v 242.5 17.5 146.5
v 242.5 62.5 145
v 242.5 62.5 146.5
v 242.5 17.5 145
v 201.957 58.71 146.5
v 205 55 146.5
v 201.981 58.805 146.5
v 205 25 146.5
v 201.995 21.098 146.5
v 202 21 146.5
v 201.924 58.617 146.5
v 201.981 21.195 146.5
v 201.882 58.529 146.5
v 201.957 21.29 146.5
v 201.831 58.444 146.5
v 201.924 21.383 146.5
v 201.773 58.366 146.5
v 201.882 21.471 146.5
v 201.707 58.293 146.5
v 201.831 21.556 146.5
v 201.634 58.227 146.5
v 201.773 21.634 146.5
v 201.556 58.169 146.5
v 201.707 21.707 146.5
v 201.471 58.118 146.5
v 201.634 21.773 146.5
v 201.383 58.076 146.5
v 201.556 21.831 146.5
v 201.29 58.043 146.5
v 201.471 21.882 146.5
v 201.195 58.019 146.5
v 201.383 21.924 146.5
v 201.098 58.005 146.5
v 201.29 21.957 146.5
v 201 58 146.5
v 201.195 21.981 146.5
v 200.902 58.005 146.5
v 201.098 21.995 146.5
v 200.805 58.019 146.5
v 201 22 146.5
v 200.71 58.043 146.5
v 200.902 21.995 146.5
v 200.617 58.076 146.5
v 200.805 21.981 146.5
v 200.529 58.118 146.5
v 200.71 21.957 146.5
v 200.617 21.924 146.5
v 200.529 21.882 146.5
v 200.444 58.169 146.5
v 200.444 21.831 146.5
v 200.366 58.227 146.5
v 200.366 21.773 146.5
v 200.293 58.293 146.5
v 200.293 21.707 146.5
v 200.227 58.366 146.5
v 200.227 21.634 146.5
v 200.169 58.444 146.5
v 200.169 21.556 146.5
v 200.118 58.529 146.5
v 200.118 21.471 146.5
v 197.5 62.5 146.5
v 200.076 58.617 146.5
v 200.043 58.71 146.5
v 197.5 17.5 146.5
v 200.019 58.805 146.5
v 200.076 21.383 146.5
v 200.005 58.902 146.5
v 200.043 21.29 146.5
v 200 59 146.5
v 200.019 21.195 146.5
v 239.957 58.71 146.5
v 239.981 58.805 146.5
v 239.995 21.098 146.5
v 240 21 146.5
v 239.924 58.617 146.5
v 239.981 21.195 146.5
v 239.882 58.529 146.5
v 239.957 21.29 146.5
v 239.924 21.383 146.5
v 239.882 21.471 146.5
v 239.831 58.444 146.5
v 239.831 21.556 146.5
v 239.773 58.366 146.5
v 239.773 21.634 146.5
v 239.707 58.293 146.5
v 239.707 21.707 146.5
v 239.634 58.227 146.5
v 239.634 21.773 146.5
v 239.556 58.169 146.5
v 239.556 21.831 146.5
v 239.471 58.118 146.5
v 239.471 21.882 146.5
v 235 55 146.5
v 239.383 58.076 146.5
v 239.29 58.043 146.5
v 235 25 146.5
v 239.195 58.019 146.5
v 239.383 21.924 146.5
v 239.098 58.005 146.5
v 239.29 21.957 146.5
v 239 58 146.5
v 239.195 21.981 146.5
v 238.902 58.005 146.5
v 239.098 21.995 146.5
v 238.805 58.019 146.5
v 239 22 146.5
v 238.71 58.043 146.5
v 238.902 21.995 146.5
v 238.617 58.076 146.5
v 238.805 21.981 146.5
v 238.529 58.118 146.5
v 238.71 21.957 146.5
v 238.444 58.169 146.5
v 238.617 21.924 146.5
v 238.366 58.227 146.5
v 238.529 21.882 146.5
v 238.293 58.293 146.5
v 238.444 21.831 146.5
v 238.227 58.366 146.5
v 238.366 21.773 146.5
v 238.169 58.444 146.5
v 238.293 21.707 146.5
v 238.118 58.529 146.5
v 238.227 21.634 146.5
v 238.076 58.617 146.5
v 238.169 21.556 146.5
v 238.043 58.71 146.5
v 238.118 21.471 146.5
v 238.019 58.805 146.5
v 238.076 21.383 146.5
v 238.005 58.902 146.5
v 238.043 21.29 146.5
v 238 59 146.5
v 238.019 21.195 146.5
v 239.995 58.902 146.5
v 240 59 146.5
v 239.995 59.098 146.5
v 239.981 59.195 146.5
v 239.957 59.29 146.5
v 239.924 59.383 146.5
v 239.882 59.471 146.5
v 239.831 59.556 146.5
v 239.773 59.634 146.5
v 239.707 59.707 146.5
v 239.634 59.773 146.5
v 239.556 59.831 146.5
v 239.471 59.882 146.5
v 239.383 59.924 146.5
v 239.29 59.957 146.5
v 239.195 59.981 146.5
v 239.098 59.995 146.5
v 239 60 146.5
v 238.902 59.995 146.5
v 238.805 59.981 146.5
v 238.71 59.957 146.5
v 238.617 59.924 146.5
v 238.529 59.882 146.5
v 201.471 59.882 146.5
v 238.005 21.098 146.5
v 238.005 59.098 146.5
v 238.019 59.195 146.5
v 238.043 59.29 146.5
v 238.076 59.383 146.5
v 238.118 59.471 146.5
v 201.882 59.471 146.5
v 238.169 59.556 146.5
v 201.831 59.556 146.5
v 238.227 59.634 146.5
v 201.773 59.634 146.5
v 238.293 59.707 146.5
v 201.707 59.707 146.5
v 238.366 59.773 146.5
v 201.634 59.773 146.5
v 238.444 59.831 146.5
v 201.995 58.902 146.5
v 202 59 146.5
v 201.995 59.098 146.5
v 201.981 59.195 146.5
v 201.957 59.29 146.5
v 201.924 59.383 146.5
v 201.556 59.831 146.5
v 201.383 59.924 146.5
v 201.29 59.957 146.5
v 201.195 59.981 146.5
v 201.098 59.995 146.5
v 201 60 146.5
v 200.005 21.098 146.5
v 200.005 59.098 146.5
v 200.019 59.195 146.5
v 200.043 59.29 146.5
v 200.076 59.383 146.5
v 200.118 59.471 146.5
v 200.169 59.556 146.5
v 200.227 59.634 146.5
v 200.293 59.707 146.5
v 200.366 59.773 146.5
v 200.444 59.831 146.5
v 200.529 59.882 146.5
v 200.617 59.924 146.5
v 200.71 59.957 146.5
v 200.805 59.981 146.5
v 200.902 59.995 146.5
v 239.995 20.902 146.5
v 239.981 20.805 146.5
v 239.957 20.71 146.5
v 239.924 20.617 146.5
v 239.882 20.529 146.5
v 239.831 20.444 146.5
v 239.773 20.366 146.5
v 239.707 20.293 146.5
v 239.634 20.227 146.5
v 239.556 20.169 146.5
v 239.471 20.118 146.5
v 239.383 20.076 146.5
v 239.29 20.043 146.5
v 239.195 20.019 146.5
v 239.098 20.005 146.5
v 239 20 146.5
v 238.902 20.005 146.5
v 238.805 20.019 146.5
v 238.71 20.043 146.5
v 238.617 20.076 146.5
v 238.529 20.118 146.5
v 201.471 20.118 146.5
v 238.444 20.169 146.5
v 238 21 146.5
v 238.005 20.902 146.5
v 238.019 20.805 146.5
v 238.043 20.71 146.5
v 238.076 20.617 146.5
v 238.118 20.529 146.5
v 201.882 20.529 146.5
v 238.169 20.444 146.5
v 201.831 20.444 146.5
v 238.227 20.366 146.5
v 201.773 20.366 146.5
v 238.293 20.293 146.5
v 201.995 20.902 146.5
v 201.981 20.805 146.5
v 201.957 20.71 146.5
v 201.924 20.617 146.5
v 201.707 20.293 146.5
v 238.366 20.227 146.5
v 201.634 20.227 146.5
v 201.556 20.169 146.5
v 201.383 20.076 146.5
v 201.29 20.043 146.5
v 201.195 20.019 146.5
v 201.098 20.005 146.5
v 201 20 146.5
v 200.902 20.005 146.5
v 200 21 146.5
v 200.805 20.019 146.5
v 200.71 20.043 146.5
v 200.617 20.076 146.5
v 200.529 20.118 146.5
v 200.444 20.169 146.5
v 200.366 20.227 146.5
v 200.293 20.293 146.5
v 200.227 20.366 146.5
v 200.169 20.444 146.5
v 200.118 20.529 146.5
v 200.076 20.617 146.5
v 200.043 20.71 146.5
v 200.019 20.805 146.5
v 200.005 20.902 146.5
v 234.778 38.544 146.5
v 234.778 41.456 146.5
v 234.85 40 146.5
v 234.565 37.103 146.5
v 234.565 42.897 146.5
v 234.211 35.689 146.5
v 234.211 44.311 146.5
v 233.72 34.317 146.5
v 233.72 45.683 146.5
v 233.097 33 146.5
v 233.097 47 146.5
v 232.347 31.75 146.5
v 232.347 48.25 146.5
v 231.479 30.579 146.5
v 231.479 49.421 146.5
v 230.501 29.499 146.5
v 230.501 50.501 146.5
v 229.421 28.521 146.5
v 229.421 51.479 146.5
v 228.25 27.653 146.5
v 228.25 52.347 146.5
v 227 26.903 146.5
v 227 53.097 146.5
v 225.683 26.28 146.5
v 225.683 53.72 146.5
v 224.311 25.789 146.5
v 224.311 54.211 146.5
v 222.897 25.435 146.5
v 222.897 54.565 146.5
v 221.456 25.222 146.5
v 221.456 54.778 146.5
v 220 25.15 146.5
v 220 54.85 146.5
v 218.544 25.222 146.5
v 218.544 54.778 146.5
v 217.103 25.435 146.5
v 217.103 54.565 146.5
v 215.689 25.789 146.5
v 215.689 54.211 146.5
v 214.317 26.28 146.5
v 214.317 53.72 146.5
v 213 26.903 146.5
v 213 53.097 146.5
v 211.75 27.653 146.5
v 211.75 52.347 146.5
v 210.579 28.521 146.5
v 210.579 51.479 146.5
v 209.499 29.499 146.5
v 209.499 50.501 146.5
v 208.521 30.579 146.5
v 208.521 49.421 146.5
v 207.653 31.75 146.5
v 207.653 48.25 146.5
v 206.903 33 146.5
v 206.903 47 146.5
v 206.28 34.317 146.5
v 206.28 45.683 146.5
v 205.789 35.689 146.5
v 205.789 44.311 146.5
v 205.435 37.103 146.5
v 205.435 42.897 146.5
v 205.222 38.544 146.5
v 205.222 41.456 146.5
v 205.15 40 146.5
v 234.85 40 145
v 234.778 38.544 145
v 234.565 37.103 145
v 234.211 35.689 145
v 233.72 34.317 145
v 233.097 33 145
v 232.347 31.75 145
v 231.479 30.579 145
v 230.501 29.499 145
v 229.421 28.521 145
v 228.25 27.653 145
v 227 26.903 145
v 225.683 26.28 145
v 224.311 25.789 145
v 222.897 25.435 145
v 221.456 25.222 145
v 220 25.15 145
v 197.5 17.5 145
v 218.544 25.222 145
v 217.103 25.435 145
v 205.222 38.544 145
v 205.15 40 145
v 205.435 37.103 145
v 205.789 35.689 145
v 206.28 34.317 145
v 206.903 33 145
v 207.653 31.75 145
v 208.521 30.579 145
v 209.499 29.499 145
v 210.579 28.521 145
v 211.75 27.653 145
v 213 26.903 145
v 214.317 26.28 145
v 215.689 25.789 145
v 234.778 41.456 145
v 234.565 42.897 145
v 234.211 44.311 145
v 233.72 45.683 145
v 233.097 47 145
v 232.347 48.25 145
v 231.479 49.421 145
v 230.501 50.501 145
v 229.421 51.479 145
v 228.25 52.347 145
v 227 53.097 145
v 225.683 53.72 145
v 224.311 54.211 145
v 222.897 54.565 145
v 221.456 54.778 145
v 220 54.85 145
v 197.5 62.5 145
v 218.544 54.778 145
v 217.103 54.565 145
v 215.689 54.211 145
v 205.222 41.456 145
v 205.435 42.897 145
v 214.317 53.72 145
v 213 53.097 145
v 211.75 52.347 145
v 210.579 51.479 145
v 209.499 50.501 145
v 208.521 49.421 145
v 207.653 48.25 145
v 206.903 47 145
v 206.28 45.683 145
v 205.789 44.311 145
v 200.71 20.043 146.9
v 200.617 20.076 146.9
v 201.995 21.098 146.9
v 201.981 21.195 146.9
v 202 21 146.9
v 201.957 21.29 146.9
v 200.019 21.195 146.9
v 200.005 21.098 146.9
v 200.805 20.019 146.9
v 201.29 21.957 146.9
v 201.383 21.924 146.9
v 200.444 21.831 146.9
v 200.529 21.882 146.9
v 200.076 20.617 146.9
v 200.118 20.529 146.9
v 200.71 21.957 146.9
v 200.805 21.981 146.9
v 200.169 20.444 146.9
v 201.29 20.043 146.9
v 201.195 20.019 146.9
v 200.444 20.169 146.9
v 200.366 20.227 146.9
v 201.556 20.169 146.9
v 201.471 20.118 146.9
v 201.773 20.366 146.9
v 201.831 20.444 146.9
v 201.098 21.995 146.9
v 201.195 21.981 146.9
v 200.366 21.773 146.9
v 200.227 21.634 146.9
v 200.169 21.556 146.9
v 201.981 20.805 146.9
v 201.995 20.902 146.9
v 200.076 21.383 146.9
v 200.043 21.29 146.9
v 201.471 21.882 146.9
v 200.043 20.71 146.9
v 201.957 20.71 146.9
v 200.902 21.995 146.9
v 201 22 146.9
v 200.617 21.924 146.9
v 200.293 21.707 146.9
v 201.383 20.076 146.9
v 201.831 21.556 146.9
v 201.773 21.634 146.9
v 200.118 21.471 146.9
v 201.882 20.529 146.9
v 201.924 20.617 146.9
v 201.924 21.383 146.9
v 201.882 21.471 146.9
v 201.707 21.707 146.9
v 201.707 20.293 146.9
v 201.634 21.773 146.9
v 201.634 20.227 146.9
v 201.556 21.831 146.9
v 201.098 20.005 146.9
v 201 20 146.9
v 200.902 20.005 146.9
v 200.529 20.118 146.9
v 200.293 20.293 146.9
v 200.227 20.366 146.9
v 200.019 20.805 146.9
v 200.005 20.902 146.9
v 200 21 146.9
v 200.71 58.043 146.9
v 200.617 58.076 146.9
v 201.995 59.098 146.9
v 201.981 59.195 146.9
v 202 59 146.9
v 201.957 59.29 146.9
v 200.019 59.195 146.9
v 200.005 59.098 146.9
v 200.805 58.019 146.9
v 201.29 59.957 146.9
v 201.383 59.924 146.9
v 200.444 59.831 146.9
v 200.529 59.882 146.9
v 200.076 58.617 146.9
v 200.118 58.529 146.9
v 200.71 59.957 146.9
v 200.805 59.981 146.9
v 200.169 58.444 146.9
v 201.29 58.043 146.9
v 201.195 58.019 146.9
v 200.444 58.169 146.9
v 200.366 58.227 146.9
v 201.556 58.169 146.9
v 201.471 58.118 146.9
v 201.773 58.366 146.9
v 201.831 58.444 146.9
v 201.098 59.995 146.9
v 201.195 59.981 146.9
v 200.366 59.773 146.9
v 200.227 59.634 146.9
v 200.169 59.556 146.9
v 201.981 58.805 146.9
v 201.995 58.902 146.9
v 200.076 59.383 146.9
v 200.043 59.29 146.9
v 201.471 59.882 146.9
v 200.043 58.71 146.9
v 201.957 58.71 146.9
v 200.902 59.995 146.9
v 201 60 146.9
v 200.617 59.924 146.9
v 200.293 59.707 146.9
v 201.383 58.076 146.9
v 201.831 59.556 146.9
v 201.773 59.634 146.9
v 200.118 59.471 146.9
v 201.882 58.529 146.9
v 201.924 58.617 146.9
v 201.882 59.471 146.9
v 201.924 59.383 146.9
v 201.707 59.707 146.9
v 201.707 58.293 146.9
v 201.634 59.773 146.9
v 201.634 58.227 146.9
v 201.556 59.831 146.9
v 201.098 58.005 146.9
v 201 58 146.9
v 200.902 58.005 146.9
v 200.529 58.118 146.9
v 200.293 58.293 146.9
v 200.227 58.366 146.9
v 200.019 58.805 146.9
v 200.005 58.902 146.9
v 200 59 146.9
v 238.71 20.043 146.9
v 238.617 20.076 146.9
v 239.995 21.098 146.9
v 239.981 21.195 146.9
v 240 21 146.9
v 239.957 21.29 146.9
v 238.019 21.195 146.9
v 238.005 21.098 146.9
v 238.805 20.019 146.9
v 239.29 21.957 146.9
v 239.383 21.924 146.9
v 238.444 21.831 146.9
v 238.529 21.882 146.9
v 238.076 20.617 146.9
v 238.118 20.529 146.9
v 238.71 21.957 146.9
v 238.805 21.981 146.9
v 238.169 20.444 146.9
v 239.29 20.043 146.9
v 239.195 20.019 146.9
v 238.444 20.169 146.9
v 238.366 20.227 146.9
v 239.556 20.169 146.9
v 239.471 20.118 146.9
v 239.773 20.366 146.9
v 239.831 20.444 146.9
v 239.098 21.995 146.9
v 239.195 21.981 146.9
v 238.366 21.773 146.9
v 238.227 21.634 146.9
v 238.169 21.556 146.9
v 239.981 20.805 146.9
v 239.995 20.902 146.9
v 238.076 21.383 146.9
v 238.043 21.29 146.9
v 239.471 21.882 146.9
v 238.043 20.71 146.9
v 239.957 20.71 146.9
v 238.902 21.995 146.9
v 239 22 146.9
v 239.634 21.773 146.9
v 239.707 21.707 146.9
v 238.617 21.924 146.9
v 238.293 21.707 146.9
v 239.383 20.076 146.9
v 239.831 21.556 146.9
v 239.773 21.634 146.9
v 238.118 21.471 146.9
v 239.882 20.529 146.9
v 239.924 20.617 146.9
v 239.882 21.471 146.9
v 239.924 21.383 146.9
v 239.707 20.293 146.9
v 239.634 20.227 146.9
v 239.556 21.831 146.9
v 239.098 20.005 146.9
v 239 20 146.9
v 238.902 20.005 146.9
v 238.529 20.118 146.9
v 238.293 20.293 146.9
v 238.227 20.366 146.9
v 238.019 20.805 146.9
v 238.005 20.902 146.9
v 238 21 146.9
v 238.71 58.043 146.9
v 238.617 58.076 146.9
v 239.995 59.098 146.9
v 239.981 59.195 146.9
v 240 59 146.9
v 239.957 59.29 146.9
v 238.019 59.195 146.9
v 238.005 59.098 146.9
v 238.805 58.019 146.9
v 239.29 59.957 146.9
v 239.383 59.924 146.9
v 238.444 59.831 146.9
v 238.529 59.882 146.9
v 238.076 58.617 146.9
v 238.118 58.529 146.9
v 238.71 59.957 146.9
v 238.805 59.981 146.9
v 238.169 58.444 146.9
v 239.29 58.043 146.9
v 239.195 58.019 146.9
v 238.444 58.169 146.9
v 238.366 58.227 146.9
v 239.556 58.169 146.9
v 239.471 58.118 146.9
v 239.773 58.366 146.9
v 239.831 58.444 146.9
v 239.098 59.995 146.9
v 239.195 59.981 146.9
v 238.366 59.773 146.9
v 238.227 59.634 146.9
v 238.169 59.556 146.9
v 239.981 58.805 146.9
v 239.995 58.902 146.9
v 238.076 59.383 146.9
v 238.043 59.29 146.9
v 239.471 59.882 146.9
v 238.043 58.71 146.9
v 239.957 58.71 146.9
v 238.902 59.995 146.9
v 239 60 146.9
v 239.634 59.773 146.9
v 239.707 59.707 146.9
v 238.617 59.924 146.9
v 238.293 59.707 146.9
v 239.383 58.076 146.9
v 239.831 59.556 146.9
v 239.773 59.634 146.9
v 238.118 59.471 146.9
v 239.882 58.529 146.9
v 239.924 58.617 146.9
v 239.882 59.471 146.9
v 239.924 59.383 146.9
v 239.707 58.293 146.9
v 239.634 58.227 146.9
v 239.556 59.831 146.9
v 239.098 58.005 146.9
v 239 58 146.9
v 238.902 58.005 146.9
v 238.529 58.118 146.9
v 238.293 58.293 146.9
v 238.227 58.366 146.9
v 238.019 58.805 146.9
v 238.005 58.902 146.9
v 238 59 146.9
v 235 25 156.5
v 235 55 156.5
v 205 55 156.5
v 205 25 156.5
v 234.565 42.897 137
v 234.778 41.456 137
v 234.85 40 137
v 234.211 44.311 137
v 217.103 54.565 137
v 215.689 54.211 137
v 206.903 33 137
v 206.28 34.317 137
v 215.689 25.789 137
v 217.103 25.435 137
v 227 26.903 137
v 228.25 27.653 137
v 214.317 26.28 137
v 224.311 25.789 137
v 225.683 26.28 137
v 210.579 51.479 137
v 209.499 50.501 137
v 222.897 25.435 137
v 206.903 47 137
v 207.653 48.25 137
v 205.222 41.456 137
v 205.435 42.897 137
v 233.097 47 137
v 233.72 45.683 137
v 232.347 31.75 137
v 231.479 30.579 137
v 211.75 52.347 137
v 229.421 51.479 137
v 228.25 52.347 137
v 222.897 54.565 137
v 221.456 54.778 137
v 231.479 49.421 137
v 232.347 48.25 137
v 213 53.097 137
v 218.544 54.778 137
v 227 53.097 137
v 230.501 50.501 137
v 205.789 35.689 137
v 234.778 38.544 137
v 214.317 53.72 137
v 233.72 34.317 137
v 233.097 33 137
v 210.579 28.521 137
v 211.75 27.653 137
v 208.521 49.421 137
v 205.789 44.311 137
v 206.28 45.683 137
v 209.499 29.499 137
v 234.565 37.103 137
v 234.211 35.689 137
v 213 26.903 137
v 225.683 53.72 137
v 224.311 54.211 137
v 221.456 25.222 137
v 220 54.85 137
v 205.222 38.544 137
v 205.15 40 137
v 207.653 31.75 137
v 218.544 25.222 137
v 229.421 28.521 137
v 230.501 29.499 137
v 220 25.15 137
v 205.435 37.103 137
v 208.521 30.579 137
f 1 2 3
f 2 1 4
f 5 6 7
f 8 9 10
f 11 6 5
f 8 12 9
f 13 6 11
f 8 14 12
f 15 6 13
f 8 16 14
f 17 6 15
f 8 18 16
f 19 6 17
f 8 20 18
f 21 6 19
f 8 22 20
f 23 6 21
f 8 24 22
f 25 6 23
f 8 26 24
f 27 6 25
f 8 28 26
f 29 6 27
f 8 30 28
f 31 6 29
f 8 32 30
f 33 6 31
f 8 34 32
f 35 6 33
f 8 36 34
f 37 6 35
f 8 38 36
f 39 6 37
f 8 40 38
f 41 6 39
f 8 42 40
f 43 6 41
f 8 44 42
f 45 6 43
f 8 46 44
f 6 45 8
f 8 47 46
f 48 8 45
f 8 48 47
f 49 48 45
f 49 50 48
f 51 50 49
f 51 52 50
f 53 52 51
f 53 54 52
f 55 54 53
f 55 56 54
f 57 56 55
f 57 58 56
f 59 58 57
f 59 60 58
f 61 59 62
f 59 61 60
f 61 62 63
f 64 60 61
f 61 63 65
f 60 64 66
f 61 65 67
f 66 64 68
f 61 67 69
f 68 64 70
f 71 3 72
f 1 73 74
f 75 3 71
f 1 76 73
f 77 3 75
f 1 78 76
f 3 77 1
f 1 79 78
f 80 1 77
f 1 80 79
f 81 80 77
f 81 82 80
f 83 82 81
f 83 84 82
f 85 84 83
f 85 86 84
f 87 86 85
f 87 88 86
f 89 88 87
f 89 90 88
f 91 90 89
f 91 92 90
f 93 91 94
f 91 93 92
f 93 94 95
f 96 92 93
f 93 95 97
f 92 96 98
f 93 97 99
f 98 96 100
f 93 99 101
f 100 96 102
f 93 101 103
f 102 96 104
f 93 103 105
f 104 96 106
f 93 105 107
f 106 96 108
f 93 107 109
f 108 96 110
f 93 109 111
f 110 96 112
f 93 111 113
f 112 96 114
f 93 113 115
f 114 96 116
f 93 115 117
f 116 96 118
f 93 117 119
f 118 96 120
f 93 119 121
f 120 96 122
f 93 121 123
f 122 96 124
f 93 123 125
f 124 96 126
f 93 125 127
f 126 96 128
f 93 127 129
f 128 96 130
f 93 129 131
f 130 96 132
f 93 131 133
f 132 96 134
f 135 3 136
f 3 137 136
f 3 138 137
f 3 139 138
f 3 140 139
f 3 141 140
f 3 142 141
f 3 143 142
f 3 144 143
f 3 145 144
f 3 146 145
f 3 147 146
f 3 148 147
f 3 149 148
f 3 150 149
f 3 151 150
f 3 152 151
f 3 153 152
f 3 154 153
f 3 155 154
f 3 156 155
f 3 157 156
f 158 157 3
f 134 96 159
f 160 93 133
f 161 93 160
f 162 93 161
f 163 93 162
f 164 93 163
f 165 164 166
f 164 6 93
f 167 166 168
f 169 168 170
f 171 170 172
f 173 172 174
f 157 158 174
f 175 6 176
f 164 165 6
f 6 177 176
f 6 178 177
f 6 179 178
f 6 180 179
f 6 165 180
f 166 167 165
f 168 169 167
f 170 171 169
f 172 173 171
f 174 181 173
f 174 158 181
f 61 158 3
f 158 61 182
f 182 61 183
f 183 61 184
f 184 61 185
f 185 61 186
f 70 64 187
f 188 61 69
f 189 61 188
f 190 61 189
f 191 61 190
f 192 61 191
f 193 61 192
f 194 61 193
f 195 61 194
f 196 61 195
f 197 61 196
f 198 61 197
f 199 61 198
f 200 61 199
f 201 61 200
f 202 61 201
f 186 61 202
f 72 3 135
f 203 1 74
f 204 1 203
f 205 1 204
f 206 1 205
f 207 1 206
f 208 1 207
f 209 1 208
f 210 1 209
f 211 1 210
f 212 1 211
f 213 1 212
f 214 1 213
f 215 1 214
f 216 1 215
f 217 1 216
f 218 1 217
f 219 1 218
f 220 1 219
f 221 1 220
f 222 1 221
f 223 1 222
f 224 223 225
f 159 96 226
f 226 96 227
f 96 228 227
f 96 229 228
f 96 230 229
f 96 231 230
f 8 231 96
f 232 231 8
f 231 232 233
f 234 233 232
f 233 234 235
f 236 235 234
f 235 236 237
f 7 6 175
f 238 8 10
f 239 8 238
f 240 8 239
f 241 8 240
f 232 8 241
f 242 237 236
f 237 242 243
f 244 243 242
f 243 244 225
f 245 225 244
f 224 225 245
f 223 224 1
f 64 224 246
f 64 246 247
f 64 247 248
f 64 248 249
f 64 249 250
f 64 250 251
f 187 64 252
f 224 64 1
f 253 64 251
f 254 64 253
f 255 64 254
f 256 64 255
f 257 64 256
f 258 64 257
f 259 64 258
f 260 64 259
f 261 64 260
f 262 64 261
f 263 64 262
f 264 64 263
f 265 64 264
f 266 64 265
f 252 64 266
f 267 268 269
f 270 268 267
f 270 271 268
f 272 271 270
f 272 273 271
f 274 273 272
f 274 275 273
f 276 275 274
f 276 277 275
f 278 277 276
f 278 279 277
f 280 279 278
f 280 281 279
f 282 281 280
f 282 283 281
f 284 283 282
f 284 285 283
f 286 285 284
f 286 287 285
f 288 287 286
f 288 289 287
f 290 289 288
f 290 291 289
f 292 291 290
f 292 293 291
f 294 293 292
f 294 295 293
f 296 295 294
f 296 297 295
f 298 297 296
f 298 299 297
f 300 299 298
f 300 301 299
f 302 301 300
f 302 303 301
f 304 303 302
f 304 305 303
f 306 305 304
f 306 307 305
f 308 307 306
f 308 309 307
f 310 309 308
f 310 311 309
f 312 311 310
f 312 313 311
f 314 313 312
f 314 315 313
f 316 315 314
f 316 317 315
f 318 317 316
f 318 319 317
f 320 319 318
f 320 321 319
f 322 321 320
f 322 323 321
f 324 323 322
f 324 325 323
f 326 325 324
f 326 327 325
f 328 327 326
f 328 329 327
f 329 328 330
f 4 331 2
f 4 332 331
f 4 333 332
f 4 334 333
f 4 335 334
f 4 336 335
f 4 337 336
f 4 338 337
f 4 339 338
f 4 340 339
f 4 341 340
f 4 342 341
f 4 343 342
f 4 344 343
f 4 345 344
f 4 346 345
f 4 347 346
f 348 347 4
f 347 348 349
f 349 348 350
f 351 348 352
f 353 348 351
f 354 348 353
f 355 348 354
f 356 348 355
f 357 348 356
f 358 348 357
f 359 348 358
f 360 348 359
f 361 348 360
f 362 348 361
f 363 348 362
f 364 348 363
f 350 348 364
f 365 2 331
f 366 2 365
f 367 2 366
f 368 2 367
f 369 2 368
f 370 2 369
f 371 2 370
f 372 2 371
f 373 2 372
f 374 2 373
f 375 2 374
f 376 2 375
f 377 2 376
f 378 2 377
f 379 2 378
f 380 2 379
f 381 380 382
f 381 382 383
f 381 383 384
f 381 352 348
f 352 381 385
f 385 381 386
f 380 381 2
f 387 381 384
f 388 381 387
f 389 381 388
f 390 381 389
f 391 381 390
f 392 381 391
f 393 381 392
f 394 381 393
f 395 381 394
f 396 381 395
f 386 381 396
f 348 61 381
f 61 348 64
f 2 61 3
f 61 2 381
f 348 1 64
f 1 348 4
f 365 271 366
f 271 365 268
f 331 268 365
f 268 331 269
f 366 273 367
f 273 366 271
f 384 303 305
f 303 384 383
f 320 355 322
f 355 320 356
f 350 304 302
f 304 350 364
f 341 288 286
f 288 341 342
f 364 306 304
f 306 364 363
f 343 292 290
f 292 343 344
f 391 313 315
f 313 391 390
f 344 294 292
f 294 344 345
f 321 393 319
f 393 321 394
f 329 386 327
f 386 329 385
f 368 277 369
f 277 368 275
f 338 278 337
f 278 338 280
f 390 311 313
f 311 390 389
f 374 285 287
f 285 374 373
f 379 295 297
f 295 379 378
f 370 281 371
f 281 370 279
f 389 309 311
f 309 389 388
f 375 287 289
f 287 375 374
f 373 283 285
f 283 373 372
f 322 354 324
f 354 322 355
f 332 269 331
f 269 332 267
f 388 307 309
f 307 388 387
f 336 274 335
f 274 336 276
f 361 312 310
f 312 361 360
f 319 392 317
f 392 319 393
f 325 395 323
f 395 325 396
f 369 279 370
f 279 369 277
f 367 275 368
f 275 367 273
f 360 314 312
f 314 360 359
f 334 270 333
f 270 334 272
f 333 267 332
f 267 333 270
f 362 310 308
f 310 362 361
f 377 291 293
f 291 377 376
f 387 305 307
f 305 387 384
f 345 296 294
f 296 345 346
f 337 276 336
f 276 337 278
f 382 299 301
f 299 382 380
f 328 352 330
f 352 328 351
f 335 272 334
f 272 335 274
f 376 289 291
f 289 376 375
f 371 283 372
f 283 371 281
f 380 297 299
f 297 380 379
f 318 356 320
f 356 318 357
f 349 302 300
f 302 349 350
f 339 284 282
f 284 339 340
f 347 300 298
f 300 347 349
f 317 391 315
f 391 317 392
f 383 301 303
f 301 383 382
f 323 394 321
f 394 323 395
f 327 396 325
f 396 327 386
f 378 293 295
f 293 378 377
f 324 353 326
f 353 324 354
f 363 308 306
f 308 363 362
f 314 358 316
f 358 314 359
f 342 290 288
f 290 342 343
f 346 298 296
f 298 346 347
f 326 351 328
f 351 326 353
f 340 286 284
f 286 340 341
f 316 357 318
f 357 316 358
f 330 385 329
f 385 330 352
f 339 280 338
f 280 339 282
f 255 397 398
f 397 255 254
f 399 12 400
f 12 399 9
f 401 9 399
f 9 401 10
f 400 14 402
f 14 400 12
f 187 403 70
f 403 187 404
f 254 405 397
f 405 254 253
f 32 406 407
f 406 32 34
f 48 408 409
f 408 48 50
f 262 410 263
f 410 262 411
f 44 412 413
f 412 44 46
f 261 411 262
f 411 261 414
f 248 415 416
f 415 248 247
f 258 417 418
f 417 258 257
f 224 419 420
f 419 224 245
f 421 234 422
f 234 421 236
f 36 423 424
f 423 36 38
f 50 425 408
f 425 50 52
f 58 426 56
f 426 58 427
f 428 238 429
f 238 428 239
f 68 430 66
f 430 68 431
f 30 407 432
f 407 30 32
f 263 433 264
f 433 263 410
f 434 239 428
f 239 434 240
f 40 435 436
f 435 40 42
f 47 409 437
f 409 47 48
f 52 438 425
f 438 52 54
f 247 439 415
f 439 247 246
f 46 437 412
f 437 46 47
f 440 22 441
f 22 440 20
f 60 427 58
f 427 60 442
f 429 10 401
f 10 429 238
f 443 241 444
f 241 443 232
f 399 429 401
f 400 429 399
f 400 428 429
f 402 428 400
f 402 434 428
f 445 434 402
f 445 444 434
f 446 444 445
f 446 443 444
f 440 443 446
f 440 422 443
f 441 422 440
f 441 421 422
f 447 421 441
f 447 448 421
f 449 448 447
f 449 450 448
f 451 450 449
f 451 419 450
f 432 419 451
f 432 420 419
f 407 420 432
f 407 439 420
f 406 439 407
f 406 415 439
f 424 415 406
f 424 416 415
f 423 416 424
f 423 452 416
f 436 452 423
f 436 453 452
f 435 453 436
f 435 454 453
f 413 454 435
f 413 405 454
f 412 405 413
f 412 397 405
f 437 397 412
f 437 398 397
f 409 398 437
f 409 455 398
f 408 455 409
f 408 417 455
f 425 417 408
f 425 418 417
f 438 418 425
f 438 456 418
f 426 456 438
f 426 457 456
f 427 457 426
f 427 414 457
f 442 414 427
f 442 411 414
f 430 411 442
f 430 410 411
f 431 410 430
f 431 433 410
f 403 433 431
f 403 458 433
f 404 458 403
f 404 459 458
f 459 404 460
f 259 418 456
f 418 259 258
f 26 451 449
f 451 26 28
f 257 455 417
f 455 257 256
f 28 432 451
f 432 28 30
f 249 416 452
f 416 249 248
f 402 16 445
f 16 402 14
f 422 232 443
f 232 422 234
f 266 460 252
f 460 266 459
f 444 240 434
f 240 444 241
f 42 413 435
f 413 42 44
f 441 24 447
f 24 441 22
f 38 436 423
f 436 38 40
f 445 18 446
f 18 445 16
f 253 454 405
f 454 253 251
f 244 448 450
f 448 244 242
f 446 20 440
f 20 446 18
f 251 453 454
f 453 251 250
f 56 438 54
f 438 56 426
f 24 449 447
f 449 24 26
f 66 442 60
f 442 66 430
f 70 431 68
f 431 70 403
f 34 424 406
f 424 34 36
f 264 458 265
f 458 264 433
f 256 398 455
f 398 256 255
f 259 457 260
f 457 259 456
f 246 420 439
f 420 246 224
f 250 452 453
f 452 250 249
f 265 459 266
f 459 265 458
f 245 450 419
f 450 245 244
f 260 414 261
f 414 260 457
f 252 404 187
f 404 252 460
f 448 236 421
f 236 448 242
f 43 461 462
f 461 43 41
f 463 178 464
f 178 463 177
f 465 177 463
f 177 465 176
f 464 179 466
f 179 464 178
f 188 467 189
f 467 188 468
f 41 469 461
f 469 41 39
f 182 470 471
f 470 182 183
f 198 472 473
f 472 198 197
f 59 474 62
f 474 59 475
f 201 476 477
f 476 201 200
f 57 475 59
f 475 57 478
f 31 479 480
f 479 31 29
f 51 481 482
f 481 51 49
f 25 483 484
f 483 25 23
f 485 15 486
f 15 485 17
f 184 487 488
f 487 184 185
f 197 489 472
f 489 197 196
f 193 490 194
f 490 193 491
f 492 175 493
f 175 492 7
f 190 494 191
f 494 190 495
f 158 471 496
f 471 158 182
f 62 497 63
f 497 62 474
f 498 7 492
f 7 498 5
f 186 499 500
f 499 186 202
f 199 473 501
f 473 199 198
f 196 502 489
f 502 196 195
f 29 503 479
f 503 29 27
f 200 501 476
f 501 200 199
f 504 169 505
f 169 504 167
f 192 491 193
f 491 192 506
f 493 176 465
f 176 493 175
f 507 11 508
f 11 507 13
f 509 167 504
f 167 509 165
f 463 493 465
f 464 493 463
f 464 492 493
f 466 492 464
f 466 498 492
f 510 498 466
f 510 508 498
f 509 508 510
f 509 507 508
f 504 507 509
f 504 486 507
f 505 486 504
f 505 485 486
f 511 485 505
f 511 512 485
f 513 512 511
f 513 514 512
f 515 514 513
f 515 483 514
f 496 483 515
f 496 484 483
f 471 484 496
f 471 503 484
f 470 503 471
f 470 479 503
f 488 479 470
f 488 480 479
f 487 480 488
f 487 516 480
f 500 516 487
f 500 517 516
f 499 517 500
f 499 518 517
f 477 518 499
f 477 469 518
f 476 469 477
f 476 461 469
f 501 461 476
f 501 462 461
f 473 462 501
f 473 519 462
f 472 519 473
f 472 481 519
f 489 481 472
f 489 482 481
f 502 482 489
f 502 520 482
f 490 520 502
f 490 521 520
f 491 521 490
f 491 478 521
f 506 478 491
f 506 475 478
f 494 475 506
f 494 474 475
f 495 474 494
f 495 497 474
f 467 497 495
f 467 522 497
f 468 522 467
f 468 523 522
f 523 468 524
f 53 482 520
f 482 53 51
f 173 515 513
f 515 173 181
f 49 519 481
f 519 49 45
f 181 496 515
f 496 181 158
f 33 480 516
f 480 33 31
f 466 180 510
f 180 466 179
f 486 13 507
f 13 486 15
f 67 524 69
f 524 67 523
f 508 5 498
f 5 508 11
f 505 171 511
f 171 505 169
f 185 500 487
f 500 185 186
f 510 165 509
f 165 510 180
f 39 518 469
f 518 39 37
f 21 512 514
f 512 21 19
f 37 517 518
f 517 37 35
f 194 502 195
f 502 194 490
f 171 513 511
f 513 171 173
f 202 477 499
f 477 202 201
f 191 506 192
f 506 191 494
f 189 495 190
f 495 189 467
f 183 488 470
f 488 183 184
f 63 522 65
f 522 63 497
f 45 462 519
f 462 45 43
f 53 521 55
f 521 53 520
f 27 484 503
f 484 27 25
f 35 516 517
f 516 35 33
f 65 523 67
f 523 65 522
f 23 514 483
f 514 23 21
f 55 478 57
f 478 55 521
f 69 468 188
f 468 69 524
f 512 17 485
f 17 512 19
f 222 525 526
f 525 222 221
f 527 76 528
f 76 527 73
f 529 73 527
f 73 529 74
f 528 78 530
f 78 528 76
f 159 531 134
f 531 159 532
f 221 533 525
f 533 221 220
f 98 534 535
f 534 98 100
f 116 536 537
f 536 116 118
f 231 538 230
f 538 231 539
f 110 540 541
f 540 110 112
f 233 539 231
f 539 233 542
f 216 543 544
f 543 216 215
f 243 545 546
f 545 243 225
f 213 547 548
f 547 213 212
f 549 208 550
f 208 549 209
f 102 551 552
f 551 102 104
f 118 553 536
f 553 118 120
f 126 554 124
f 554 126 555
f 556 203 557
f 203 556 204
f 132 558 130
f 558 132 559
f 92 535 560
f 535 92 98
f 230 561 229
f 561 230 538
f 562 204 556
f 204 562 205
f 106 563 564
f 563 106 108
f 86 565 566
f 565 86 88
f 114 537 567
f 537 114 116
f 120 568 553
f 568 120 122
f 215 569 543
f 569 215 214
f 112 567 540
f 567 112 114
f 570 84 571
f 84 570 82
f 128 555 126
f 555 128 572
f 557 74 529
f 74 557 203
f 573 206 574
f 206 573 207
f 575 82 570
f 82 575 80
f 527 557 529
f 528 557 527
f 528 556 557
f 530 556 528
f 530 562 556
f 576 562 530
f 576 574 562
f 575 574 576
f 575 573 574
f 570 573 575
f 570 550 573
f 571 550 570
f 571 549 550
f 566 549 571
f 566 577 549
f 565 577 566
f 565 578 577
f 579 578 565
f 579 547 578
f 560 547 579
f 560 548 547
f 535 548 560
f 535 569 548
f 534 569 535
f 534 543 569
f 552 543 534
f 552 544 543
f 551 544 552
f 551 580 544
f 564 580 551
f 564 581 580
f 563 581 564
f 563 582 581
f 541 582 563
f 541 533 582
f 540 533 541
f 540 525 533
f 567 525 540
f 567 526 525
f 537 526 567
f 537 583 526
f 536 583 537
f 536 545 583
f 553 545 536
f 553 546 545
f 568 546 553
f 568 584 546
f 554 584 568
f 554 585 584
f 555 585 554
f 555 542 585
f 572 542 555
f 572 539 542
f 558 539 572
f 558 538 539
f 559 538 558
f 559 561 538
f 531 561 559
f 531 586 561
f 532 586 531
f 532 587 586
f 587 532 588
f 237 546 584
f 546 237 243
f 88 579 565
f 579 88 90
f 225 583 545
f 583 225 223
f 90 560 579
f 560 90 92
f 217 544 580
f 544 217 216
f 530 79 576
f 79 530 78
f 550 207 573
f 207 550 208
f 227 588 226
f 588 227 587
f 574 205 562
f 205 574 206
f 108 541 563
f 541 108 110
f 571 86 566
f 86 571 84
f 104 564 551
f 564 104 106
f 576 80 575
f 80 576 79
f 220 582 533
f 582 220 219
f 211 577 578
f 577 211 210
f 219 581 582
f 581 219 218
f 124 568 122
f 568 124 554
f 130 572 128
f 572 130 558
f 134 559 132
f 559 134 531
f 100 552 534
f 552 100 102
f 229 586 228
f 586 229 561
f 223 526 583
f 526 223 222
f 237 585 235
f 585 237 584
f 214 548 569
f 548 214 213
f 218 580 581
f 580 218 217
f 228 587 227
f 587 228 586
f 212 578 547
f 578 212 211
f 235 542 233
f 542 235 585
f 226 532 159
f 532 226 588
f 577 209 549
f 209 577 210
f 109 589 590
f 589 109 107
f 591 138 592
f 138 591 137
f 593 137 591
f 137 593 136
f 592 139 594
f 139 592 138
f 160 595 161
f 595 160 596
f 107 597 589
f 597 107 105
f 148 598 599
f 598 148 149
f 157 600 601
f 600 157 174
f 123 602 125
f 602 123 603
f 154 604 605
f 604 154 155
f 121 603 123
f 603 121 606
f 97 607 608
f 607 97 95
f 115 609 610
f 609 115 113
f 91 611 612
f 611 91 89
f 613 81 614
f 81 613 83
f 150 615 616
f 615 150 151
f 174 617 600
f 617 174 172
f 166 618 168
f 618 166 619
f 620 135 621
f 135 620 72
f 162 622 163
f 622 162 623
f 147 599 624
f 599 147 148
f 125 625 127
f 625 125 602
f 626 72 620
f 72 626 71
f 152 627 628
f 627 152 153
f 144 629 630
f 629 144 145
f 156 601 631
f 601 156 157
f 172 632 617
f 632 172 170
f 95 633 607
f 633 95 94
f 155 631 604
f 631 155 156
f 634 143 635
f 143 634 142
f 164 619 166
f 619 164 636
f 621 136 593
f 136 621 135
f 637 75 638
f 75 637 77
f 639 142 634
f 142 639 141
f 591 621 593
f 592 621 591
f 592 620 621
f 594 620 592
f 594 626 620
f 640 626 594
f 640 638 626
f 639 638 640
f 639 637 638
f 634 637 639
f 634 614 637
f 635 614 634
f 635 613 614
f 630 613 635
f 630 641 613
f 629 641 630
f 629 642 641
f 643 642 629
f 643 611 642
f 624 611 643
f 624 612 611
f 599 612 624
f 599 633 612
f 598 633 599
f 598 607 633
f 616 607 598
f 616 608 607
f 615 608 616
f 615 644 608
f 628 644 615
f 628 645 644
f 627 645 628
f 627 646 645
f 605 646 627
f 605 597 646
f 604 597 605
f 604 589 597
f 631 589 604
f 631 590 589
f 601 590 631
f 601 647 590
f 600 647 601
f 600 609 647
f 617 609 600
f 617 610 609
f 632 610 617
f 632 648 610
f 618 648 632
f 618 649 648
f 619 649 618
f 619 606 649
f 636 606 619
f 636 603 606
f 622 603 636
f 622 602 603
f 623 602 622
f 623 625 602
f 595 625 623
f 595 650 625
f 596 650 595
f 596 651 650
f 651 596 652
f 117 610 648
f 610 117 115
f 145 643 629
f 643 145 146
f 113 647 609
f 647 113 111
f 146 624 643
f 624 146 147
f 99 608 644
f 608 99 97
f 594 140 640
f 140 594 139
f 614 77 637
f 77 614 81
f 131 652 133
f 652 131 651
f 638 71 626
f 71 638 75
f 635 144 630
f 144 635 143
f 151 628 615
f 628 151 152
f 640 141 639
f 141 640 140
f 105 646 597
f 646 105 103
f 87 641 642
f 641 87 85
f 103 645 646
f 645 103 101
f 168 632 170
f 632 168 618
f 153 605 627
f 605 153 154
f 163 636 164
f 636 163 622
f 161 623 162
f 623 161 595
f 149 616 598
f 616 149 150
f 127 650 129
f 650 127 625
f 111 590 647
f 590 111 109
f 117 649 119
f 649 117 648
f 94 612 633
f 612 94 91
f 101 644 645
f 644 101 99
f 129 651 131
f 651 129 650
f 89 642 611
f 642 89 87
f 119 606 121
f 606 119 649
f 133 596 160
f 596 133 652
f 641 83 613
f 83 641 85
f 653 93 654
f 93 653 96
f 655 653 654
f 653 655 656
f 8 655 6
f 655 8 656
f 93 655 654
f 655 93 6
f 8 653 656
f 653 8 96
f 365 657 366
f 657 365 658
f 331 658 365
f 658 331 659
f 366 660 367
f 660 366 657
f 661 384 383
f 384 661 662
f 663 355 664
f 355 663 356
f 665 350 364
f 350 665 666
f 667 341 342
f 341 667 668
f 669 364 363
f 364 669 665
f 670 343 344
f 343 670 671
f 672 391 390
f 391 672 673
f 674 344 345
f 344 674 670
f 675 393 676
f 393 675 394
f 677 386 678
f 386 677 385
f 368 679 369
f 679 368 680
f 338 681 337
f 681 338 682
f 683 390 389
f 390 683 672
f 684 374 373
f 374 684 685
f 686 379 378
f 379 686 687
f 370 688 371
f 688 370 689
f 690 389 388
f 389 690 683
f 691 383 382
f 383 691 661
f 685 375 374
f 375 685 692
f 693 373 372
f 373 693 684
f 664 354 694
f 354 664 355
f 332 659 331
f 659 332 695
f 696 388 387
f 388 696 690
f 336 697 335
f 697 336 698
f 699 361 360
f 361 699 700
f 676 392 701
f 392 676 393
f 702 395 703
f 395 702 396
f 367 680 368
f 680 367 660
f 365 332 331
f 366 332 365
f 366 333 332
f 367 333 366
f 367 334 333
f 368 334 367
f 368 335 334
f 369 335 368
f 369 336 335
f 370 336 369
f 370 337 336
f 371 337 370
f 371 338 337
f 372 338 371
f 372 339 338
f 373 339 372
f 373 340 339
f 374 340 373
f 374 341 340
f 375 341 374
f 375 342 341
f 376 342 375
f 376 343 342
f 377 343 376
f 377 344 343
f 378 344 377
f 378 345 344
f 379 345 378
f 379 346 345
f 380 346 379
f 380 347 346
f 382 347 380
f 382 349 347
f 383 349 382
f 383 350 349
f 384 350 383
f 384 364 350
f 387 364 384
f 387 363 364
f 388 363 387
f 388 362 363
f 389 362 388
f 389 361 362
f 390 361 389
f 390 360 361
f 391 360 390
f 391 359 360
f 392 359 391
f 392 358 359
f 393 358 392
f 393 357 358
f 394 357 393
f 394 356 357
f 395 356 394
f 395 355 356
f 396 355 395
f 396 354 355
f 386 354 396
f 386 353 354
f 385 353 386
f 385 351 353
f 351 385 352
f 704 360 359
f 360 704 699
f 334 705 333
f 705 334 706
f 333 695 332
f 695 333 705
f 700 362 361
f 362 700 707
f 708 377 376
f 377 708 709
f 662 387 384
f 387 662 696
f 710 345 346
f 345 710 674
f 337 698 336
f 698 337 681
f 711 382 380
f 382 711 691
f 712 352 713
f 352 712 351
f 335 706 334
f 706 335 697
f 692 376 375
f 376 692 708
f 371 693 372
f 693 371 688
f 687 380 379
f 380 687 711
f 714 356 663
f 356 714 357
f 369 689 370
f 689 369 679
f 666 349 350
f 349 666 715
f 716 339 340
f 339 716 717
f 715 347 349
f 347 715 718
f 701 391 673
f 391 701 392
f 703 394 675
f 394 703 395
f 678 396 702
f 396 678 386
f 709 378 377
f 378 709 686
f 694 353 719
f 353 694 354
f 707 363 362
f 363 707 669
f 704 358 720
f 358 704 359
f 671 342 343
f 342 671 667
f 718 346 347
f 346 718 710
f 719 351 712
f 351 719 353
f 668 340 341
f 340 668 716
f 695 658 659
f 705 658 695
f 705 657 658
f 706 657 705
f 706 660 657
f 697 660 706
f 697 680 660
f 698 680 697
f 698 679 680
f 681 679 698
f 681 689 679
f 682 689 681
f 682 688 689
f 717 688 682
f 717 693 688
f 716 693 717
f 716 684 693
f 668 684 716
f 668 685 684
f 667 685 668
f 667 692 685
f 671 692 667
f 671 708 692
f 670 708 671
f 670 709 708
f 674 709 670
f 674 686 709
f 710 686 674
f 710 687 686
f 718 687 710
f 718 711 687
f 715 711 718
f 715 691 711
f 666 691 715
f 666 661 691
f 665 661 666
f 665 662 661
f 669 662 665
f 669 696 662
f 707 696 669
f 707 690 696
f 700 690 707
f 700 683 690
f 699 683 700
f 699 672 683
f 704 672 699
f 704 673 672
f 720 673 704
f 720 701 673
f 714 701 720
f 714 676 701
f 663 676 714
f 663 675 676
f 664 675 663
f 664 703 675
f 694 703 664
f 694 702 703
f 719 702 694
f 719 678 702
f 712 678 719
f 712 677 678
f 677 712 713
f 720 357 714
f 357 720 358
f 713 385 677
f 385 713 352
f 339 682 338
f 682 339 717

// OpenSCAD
// External rear exhaust concept. Source D7 and wood are not embedded: geometry review only.
// The four support markers are adapter-to-wood candidates, NOT the fan's three mounting holes.
// SUNON fan hole XY pattern is not transcribed; no fabrication hole locations are modeled.
// Not a fabrication drawing. Fasteners, plate material, seal, intake and guard remain TBD.
$fn=64;
CX=220; CY=40;
FAN_W=30; FAN_T=10; FAN_Z=146.5;
WOOD_PORT_D=29.7;
PLATE_W=45; PLATE_T=1.5; PLATE_Z=145;
SUPPORT_OFFSET=19;
SHOW_PORT_AXIS=true;
SHOW_SUPPORT_MARKERS=true;

// Symbolic fan envelope: SUNON MF30100V3-1000U-A99 size class; actual CAD not supplied.
color([0.12,0.32,0.58,0.85])
 translate([CX-FAN_W/2,CY-FAN_W/2,FAN_Z]) cube([FAN_W,FAN_W,FAN_T]);

// Positional adapter plate envelope. The Ø29.7 nominal concept port has zero nominal diametral
// difference to the fan inlet; it is not a fit allowance. Wood-hole tolerance is unresolved.
// Anchor centers are four adapter-to-wood markers, not specified drill diameters. No wood solid
// is included, so no boolean wood cut is implied.
color([0.66,0.43,0.19,0.8]) difference(){
 translate([CX-PLATE_W/2,CY-PLATE_W/2,PLATE_Z]) cube([PLATE_W,PLATE_W,PLATE_T]);
 translate([CX,CY,PLATE_Z-0.1]) cylinder(d=WOOD_PORT_D,h=PLATE_T+0.2);
}
if(SHOW_SUPPORT_MARKERS)
 for(dx=[-SUPPORT_OFFSET,SUPPORT_OFFSET],dy=[-SUPPORT_OFFSET,SUPPORT_OFFSET])
  color([0.95,0.7,0.05]) translate([CX+dx,CY+dy,PLATE_Z+PLATE_T]) cylinder(d=2,h=0.4);
if(SHOW_PORT_AXIS)
 color([1,0.1,0.1,0.3]) translate([CX,CY,137]) cylinder(d=WOOD_PORT_D,h=8);
